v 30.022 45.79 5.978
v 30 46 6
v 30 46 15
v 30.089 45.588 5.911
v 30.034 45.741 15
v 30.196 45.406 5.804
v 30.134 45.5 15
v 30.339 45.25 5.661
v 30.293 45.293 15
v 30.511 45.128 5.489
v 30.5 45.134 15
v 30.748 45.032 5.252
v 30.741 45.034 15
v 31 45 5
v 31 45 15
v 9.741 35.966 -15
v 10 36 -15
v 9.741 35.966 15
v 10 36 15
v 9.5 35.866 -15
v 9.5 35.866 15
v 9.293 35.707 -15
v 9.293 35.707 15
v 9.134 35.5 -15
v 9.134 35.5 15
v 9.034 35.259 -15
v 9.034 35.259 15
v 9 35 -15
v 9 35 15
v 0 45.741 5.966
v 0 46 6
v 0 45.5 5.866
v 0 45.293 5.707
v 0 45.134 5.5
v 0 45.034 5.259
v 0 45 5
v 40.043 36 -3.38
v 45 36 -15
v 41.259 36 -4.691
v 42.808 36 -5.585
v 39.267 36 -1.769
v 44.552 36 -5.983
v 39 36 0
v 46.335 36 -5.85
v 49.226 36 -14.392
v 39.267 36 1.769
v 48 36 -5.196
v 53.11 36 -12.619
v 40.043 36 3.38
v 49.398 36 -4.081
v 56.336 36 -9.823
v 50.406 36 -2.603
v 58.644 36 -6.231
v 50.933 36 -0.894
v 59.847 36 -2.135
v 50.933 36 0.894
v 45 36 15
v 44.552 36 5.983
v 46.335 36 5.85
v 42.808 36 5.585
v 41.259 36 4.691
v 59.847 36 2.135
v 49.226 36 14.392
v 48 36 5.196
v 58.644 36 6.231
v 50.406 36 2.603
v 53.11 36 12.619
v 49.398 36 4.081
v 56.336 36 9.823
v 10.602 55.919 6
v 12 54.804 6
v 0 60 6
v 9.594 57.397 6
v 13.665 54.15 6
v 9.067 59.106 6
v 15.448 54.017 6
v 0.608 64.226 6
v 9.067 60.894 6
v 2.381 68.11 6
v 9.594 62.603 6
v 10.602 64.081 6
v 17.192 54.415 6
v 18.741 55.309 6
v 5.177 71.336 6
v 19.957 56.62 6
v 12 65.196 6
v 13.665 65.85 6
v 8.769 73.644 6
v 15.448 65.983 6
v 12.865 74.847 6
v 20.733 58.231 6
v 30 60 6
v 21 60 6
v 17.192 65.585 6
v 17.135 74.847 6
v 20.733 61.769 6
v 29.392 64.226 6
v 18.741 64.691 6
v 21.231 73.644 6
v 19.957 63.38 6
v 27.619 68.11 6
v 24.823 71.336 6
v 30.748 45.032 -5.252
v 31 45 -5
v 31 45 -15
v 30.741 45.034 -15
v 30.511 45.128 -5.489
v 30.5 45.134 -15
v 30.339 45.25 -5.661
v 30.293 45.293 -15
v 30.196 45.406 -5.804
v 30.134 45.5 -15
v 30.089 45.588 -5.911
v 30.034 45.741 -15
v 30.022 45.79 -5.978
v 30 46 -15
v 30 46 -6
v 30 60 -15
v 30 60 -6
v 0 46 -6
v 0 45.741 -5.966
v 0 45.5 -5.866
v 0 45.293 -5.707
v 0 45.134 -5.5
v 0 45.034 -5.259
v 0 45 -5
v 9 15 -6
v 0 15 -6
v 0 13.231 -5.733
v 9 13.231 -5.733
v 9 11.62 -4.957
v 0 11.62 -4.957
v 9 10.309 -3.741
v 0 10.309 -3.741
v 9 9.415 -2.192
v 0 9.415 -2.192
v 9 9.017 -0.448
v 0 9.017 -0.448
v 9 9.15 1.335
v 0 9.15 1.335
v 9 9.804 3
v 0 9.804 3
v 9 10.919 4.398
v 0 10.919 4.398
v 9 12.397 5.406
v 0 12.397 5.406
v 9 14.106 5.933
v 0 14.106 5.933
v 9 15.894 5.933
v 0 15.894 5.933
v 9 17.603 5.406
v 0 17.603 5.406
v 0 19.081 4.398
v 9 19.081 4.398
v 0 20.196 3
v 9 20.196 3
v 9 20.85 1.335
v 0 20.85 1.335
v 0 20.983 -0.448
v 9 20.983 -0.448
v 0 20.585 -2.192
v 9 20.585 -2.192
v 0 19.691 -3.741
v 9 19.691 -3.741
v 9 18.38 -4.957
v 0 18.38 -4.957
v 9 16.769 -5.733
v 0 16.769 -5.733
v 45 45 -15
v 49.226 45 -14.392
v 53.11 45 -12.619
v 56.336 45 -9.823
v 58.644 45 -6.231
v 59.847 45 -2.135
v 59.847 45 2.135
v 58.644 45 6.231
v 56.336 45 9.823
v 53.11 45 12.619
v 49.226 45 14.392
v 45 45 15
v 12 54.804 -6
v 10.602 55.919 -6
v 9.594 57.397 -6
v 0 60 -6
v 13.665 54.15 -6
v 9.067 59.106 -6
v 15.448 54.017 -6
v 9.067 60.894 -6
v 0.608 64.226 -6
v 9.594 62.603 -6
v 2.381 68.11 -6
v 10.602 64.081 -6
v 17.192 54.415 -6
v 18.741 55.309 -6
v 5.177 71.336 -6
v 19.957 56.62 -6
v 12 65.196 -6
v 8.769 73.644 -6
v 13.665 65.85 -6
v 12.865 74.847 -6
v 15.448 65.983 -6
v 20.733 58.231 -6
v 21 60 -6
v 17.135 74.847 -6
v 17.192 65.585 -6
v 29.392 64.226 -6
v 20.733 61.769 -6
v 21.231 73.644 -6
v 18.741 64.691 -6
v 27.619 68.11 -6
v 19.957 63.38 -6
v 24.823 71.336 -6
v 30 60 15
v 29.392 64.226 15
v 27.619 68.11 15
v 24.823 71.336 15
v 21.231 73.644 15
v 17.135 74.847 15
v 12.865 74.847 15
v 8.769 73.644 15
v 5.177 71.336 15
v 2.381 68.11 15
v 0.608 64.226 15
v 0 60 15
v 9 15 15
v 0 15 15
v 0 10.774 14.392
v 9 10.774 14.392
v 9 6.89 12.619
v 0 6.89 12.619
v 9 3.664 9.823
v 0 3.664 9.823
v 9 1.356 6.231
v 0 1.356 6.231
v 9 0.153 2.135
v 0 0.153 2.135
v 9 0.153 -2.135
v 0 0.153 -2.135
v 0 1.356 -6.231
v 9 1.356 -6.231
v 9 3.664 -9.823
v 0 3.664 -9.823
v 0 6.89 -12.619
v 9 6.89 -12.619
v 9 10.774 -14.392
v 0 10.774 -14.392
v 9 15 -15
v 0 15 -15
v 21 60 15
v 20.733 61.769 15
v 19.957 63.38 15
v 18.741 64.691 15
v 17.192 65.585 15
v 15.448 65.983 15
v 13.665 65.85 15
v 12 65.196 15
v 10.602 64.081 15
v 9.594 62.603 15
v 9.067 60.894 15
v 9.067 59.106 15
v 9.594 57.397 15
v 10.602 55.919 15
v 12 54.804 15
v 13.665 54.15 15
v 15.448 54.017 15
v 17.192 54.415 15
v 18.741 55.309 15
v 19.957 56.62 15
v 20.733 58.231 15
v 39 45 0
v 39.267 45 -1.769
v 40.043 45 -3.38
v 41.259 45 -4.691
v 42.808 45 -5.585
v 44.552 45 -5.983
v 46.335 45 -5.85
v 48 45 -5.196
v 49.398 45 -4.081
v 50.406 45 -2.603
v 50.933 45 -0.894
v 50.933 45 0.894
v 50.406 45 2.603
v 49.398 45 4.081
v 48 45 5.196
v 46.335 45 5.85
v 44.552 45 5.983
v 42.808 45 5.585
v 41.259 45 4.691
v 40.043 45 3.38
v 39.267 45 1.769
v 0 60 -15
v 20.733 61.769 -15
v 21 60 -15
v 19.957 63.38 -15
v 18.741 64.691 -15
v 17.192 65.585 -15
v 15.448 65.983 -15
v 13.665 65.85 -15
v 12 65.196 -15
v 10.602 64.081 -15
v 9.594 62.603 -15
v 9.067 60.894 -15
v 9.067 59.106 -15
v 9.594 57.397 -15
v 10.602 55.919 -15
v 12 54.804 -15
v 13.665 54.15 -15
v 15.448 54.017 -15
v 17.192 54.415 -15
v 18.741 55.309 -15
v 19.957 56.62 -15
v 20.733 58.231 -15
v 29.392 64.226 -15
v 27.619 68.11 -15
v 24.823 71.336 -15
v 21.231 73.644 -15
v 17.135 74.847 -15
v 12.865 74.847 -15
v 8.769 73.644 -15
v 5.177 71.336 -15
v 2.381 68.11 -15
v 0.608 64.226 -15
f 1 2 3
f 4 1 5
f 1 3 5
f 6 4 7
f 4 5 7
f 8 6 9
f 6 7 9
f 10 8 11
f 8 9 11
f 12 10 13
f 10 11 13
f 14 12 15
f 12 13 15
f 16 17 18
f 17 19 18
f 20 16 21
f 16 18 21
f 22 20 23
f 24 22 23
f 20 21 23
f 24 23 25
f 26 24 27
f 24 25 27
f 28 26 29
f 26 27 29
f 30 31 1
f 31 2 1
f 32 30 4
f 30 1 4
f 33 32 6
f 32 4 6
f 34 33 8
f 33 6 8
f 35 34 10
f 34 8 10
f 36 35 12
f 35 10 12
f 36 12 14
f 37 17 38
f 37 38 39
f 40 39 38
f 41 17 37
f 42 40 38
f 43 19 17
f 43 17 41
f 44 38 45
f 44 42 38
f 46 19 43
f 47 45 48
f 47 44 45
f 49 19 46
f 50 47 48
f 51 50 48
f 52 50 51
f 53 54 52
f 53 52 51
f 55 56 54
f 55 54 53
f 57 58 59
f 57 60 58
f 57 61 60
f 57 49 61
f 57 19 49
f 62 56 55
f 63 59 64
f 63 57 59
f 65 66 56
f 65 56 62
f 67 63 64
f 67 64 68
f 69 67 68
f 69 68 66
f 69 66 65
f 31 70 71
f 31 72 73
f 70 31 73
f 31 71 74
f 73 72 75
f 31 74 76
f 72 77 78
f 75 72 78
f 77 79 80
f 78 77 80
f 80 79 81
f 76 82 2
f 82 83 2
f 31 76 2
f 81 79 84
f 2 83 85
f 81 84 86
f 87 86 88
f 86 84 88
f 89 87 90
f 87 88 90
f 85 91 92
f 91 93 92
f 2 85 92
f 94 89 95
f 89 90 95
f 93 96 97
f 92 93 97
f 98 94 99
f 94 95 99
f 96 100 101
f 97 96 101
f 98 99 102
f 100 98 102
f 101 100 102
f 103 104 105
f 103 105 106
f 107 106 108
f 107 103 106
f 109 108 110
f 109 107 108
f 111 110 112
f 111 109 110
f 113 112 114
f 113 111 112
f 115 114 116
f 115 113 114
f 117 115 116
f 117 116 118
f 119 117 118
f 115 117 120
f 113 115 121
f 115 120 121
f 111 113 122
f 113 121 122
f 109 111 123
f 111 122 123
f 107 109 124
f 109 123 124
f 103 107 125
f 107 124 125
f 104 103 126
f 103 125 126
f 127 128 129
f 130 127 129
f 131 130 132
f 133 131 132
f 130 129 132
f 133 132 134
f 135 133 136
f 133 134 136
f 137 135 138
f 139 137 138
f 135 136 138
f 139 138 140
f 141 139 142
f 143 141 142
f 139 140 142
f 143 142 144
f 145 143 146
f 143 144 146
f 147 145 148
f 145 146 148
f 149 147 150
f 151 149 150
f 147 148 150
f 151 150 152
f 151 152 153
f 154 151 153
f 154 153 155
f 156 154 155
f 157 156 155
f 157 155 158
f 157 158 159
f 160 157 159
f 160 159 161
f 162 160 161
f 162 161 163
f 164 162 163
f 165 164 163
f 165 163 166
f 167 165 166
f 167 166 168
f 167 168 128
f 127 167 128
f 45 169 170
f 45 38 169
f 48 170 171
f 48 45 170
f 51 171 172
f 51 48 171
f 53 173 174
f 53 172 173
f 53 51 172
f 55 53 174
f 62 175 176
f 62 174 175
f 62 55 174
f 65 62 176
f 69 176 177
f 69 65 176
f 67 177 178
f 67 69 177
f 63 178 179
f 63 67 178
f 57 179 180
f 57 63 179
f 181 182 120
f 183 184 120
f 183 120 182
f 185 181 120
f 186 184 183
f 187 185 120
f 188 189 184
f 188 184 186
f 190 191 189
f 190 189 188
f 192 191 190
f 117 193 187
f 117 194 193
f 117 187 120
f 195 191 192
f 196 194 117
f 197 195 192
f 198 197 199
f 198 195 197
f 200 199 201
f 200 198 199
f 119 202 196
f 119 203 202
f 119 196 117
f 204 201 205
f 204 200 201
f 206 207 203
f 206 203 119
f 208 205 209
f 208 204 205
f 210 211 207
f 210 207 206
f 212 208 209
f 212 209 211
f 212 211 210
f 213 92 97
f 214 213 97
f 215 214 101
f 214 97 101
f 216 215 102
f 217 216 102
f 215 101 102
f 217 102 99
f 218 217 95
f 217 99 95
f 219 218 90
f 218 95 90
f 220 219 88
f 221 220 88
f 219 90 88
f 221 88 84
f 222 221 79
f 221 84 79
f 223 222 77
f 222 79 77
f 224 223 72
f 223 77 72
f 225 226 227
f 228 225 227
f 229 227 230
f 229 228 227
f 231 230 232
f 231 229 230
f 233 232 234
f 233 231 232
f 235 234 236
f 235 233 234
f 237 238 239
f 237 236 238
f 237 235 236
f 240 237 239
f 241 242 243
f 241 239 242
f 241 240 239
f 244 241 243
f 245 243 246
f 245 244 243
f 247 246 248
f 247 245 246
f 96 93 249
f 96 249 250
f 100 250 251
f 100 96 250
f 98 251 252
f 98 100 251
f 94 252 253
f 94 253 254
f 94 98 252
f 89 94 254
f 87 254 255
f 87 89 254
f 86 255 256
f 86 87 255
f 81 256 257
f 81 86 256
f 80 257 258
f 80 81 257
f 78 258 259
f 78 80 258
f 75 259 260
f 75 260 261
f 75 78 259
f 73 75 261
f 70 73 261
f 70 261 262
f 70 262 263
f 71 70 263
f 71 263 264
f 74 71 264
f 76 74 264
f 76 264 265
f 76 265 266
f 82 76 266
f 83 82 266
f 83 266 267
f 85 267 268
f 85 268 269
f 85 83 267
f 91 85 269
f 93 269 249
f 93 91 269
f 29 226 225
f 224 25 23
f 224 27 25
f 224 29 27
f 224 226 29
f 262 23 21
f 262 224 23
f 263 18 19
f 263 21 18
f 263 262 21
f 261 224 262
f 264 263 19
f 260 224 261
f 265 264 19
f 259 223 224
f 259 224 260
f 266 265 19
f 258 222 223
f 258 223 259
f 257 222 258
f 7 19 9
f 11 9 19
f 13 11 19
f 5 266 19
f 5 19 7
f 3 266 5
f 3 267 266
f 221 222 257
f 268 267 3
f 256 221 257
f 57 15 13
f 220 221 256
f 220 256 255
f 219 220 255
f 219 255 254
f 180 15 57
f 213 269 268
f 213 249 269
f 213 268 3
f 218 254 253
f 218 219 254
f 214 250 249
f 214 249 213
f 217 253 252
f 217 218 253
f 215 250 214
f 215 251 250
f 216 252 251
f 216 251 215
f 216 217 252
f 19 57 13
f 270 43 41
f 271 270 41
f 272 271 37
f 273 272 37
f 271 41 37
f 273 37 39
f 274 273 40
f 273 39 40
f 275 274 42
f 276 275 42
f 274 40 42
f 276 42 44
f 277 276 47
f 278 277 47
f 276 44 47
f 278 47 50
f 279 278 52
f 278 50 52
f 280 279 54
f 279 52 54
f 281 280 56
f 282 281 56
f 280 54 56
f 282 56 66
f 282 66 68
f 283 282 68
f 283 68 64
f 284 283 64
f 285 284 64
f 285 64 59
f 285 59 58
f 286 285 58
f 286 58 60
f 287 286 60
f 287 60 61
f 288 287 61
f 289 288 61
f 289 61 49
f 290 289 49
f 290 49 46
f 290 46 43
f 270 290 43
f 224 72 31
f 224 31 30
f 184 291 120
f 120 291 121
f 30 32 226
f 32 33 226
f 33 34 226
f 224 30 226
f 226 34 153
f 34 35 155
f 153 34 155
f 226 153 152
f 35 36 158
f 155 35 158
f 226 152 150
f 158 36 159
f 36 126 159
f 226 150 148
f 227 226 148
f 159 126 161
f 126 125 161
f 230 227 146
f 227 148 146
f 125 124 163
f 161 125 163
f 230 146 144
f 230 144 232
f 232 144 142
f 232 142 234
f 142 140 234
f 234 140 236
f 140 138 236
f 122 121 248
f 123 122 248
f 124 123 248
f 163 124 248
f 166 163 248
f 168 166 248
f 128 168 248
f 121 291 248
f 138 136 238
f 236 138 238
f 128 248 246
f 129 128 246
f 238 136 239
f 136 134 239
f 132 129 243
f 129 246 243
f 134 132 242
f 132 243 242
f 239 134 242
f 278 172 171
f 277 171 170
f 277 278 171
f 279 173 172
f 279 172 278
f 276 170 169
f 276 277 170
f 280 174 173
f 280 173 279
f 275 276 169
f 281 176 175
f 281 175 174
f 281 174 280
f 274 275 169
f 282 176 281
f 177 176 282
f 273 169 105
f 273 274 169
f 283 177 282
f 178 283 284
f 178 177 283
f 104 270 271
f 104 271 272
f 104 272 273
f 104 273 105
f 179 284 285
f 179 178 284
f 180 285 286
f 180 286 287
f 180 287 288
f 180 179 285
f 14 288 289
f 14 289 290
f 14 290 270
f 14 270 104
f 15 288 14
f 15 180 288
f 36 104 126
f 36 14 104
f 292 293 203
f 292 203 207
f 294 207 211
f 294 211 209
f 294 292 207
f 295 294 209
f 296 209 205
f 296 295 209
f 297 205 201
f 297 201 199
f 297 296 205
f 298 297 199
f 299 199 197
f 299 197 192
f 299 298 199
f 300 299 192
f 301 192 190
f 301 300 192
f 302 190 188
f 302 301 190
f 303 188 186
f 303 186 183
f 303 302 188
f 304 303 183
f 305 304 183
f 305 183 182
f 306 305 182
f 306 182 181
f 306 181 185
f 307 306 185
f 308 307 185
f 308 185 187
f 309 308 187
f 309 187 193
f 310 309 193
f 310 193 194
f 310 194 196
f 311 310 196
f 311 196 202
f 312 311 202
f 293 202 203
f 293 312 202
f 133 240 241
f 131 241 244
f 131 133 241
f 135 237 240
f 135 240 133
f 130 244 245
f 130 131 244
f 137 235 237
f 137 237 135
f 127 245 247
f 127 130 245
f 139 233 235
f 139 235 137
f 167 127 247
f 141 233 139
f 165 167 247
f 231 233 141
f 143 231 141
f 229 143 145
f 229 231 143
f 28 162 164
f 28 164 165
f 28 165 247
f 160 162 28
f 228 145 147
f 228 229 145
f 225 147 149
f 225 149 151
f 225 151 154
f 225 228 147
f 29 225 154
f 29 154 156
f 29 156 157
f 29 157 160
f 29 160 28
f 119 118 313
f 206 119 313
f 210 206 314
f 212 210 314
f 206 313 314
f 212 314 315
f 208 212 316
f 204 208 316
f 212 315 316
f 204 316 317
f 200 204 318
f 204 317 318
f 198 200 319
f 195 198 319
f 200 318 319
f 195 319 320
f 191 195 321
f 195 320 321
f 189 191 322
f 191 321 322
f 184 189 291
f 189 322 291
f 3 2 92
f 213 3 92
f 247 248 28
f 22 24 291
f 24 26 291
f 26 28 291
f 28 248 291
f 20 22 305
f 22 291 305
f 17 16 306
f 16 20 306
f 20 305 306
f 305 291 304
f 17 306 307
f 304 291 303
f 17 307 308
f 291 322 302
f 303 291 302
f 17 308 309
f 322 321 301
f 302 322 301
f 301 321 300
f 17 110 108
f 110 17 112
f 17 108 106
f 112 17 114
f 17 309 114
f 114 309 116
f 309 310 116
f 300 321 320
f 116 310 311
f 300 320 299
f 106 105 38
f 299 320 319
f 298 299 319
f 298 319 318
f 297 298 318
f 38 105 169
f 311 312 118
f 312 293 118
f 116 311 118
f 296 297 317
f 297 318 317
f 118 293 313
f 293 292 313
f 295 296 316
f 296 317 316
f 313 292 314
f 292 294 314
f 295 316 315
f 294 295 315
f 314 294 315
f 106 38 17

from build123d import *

# Parameters (mm, degrees)
BOSS_EXTRUDE1_DEPTH                  = 15
BOSS_EXTRUDE2_START                  = 6
SKETCH1_3_R                          = 6
BOSS_EXTRUDE2_DEPTH                  = 9
BOSS_EXTRUDE3_START                  = -15
SKETCH1_4_R                          = 6
BOSS_EXTRUDE3_DEPTH                  = 9
FILLET1_RADIUS                       = 15
FILLET1_LENGTH                       = 9
FILLET2_RADIUS                       = 15
FILLET2_LENGTH                       = 9
F_12_0MM_DOWEL_HOLE1_D               = 12
F_12_0MM_DOWEL_HOLE1_DEPTH           = 13
F_12_0MM_DOWEL_HOLE1_ON_FACE_2_D     = 12
F_12_0MM_DOWEL_HOLE1_ON_FACE_2_DEPTH = 13
FILLET6_R                            = 1
FILLET4_R                            = 1
FILLET5_R                            = 1
FILLET7_R                            = 1


with BuildPart() as part:
    # Sketch1 → Boss-Extrude1 (new, symmetric)
    with BuildSketch(Plane.XY):
        Polygon((0, 45), (0, 0), (9, 0), (9, 36), (60, 36), (60, 45), (30, 45), align=None)
    extrude(amount=BOSS_EXTRUDE1_DEPTH, both=True)

    # Sketch1<3> → Boss-Extrude2 (add)
    with BuildSketch(Plane.XY.offset(BOSS_EXTRUDE2_START)):
        with BuildLine():
            Line((0, 60), (0, 45))
            Line((0, 45), (30, 45))
            Line((30, 45), (30, 60))
            ThreePointArc((30, 60), (15, 75), (0, 60))
        make_face()
        with Locations((15, 60)):
            Circle(SKETCH1_3_R, mode=Mode.SUBTRACT)
    extrude(amount=BOSS_EXTRUDE2_DEPTH)

    # Sketch1<4> → Boss-Extrude3 (add)
    with BuildSketch(Plane.XY.offset(BOSS_EXTRUDE3_START)):
        with BuildLine():
            Line((0, 60), (0, 45))
            Line((0, 45), (30, 45))
            Line((30, 45), (30, 60))
            ThreePointArc((30, 60), (15, 75), (0, 60))
        make_face()
        with Locations((15, 60)):
            Circle(SKETCH1_4_R, mode=Mode.SUBTRACT)
    extrude(amount=BOSS_EXTRUDE3_DEPTH)

    # Fillet1: full round fillet: the end face becomes a half cylinder, R = half its width
    fillet1_face = Plane((60, 40.5, 0), x_dir=(0, -1, 0), z_dir=(1, 0, 0))  # on the end face: x along it, z out of the body
    fillet1_slab = fillet1_face.offset(-FILLET1_RADIUS / 2) * Box(FILLET1_LENGTH, 2 * FILLET1_RADIUS, FILLET1_RADIUS, mode=Mode.PRIVATE)  # the body's end, R deep
    fillet1_round = Plane((45, 40.5, 0), x_dir=(1, 0, 0), z_dir=(0, -1, 0)) * Cylinder(FILLET1_RADIUS, FILLET1_LENGTH, mode=Mode.PRIVATE)  # its axis R under the face
    add(fillet1_slab - fillet1_round, mode=Mode.SUBTRACT)

    # Fillet2: full round fillet: the end face becomes a half cylinder, R = half its width
    fillet2_face = Plane((4.5, 0, 0), x_dir=(1, 0, 0), z_dir=(0, -1, 0))  # on the end face: x along it, z out of the body
    fillet2_slab = fillet2_face.offset(-FILLET2_RADIUS / 2) * Box(FILLET2_LENGTH, 2 * FILLET2_RADIUS, FILLET2_RADIUS, mode=Mode.PRIVATE)  # the body's end, R deep
    fillet2_round = Plane((4.5, 15, 0), x_dir=(0, -1, 0), z_dir=(1, 0, 0)) * Cylinder(FILLET2_RADIUS, FILLET2_LENGTH, mode=Mode.PRIVATE)  # its axis R under the face
    add(fillet2_slab - fillet2_round, mode=Mode.SUBTRACT)

    # Ø12.0mm Dowel Hole1
    with Locations(Plane(origin=(45, 45, 0), x_dir=(1, 0, 0), z_dir=(0, 1, 0))):
        with Locations((0, 0)):
            Hole(F_12_0MM_DOWEL_HOLE1_D / 2, depth=F_12_0MM_DOWEL_HOLE1_DEPTH)

    # Ø12.0mm Dowel Hole1 on face 2
    with Locations(Plane(origin=(9, 15, 0), x_dir=(0, 0, 1), z_dir=(1, 0, 0))):
        with Locations((0, 0)):
            Hole(F_12_0MM_DOWEL_HOLE1_ON_FACE_2_D / 2, depth=F_12_0MM_DOWEL_HOLE1_ON_FACE_2_DEPTH)

    # Fillet6
    fillet6_edges = [part.edges().sort_by_distance(p)[0] for p in [
        (9, 36, 0),
    ]]
    fillet(fillet6_edges, radius=FILLET6_R)

    # Fillet4
    fillet4_edges = [part.edges().sort_by_distance(p)[0] for p in [
        (30, 45, -10.5),
    ]]
    fillet(fillet4_edges, radius=FILLET4_R)

    # Fillet5
    fillet5_edges = [part.edges().sort_by_distance(p)[0] for p in [
        (30, 45, 10.5),
    ]]
    fillet(fillet5_edges, radius=FILLET5_R)

    # Fillet7
    fillet7_edges = [part.edges().sort_by_distance(p)[0] for p in [
        (15.5, 45, -6),
        (15.5, 45, 6),
    ]]
    fillet(fillet7_edges, radius=FILLET7_R)


solid = part.part
